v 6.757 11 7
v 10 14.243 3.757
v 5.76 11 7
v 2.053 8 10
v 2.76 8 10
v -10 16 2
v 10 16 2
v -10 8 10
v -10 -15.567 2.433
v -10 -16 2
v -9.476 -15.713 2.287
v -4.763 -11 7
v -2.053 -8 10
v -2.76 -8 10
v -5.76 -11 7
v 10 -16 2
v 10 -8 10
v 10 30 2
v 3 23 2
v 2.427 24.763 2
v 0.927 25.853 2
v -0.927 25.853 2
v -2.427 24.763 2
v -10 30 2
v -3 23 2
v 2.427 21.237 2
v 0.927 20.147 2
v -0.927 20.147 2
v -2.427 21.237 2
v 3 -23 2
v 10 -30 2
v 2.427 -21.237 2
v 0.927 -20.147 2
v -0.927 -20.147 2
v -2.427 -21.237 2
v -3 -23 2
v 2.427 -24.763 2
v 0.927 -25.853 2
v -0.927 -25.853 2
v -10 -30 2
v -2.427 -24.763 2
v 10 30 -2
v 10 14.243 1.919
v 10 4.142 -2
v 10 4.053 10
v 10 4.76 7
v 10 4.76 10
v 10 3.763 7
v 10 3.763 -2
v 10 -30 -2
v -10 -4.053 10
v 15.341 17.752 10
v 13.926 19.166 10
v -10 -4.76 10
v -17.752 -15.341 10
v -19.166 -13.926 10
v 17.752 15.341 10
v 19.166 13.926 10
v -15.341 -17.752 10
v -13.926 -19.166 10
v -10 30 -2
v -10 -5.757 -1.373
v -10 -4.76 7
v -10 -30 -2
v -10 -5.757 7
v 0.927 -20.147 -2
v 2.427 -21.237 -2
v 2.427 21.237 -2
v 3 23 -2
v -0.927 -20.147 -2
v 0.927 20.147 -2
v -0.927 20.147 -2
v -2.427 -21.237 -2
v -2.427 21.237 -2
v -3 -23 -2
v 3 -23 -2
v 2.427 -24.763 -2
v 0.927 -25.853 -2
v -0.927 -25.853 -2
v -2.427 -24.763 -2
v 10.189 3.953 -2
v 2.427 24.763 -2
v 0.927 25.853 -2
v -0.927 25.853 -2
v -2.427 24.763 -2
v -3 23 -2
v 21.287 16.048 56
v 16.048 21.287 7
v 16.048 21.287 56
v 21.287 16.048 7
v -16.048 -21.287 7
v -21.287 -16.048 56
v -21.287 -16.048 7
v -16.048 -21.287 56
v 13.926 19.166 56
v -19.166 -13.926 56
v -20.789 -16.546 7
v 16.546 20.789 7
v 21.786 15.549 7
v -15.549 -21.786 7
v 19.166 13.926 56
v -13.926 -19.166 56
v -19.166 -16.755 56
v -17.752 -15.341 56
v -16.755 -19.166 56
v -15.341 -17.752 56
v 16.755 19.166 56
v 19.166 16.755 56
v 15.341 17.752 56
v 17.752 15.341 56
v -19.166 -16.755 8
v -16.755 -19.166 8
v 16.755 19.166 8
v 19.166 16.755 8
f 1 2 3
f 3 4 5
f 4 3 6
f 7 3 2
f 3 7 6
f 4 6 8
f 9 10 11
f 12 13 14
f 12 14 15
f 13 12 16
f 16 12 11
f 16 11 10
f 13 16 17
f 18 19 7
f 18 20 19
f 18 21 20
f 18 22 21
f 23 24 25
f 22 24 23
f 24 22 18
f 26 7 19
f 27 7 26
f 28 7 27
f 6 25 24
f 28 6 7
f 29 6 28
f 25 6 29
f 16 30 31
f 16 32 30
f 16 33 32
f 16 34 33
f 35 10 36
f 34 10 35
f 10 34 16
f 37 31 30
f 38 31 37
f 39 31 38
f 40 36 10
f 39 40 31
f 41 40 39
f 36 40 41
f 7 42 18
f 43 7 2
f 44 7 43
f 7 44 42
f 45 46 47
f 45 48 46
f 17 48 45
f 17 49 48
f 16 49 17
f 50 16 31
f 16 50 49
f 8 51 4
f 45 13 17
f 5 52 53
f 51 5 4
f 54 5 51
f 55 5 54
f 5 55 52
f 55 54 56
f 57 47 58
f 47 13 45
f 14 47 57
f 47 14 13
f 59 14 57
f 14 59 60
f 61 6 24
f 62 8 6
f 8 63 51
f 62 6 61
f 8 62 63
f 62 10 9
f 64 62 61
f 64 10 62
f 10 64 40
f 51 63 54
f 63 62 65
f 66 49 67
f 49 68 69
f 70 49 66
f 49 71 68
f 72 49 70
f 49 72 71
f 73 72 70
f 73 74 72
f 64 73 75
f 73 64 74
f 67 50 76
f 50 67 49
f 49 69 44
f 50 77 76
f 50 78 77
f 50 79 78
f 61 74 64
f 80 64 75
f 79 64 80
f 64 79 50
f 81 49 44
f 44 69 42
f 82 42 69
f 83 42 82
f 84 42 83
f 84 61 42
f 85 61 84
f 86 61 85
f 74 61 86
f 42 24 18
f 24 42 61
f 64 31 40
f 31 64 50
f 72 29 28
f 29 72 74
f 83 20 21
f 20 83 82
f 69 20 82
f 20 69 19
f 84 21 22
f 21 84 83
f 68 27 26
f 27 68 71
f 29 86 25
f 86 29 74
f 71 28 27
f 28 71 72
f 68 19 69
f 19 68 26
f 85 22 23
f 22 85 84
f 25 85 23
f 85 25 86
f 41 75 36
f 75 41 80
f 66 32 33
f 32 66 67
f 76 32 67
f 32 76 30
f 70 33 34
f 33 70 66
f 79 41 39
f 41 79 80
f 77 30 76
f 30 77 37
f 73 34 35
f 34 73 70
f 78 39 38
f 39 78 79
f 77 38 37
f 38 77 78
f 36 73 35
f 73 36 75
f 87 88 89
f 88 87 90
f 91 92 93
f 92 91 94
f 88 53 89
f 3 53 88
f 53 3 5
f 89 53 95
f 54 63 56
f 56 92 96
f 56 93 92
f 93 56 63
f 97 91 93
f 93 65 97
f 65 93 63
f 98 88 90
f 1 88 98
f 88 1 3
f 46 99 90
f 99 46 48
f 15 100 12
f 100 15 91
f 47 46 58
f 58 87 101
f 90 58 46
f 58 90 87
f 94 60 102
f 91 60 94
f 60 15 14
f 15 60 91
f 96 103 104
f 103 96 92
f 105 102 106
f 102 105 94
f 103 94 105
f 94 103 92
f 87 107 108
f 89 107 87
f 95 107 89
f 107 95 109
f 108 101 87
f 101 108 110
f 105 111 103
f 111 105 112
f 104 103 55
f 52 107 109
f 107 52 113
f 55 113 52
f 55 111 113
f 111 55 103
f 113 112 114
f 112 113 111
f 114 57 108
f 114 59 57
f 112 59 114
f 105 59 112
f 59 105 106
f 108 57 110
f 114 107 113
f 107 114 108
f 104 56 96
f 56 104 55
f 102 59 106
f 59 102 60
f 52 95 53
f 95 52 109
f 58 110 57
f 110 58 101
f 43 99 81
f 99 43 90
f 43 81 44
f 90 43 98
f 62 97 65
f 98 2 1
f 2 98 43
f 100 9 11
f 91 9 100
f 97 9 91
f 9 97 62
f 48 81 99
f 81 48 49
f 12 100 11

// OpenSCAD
module trapezoid_3d(bottom_length, top_length, height, depth) {
    points = [
        [-(bottom_length / 2), 0], // Bottom left
        [ (bottom_length / 2), 0], // Bottom right
        [ (top_length / 2), height], // Top right
        [-(top_length / 2), height] // Top left
    ];
    
    faces = [
        [0, 1, 2, 3] // Face for the trapezoid
    ];
    
    rotate([90, 0, 90]) {
        linear_extrude(height = depth) polygon(points=points, paths=faces);
    }
}

module raw_base() {
    union() {
        translate([-10, 0, 2])
        trapezoid_3d(32, 16, 8, 20);
        cube([20, 60, 4], center = true); 
    }
}

module base() {
    difference() {
        raw_base();
        translate([0, (30-2-5), 0])
        cylinder(r = 3, h = 20, center = true);
        translate([0,-(30-2-5), 0])
        cylinder(r = 3, h = 20, center = true);
    }
}



module lens(size, depth) {
    translate([0, 0, 8+size/2])
    rotate([0, 0, 45])
    cube([size, depth, size], center=true);
}

module lens_frame(size, depth) {
    difference() {
        translate([0, 0, 8+size/2])
        rotate([0, 0, 45])
        cube([size+2, depth+4, size+2], center=true);
        
        translate([0,0,76])
        rotate([0, 0, 45])
        cube([100, 20, 40], center=true);
    }
}

module lens_clearance(size, depth) {
    translate([0, 0, 8+size/2])
    rotate([0, 0, 45])
    cube([size-4, depth+5, size-4], center=true);
}

size = 50.8;
depth = 3.41;

difference() {
    union() {
        base();
        lens_frame(size, depth);
    }
    lens(size, depth);
    lens_clearance(size, depth);
}


rotate([0, 0, -45])
translate([-3, 0, -2])
trapezoid_3d(20, size+2, 9, depth+4);
